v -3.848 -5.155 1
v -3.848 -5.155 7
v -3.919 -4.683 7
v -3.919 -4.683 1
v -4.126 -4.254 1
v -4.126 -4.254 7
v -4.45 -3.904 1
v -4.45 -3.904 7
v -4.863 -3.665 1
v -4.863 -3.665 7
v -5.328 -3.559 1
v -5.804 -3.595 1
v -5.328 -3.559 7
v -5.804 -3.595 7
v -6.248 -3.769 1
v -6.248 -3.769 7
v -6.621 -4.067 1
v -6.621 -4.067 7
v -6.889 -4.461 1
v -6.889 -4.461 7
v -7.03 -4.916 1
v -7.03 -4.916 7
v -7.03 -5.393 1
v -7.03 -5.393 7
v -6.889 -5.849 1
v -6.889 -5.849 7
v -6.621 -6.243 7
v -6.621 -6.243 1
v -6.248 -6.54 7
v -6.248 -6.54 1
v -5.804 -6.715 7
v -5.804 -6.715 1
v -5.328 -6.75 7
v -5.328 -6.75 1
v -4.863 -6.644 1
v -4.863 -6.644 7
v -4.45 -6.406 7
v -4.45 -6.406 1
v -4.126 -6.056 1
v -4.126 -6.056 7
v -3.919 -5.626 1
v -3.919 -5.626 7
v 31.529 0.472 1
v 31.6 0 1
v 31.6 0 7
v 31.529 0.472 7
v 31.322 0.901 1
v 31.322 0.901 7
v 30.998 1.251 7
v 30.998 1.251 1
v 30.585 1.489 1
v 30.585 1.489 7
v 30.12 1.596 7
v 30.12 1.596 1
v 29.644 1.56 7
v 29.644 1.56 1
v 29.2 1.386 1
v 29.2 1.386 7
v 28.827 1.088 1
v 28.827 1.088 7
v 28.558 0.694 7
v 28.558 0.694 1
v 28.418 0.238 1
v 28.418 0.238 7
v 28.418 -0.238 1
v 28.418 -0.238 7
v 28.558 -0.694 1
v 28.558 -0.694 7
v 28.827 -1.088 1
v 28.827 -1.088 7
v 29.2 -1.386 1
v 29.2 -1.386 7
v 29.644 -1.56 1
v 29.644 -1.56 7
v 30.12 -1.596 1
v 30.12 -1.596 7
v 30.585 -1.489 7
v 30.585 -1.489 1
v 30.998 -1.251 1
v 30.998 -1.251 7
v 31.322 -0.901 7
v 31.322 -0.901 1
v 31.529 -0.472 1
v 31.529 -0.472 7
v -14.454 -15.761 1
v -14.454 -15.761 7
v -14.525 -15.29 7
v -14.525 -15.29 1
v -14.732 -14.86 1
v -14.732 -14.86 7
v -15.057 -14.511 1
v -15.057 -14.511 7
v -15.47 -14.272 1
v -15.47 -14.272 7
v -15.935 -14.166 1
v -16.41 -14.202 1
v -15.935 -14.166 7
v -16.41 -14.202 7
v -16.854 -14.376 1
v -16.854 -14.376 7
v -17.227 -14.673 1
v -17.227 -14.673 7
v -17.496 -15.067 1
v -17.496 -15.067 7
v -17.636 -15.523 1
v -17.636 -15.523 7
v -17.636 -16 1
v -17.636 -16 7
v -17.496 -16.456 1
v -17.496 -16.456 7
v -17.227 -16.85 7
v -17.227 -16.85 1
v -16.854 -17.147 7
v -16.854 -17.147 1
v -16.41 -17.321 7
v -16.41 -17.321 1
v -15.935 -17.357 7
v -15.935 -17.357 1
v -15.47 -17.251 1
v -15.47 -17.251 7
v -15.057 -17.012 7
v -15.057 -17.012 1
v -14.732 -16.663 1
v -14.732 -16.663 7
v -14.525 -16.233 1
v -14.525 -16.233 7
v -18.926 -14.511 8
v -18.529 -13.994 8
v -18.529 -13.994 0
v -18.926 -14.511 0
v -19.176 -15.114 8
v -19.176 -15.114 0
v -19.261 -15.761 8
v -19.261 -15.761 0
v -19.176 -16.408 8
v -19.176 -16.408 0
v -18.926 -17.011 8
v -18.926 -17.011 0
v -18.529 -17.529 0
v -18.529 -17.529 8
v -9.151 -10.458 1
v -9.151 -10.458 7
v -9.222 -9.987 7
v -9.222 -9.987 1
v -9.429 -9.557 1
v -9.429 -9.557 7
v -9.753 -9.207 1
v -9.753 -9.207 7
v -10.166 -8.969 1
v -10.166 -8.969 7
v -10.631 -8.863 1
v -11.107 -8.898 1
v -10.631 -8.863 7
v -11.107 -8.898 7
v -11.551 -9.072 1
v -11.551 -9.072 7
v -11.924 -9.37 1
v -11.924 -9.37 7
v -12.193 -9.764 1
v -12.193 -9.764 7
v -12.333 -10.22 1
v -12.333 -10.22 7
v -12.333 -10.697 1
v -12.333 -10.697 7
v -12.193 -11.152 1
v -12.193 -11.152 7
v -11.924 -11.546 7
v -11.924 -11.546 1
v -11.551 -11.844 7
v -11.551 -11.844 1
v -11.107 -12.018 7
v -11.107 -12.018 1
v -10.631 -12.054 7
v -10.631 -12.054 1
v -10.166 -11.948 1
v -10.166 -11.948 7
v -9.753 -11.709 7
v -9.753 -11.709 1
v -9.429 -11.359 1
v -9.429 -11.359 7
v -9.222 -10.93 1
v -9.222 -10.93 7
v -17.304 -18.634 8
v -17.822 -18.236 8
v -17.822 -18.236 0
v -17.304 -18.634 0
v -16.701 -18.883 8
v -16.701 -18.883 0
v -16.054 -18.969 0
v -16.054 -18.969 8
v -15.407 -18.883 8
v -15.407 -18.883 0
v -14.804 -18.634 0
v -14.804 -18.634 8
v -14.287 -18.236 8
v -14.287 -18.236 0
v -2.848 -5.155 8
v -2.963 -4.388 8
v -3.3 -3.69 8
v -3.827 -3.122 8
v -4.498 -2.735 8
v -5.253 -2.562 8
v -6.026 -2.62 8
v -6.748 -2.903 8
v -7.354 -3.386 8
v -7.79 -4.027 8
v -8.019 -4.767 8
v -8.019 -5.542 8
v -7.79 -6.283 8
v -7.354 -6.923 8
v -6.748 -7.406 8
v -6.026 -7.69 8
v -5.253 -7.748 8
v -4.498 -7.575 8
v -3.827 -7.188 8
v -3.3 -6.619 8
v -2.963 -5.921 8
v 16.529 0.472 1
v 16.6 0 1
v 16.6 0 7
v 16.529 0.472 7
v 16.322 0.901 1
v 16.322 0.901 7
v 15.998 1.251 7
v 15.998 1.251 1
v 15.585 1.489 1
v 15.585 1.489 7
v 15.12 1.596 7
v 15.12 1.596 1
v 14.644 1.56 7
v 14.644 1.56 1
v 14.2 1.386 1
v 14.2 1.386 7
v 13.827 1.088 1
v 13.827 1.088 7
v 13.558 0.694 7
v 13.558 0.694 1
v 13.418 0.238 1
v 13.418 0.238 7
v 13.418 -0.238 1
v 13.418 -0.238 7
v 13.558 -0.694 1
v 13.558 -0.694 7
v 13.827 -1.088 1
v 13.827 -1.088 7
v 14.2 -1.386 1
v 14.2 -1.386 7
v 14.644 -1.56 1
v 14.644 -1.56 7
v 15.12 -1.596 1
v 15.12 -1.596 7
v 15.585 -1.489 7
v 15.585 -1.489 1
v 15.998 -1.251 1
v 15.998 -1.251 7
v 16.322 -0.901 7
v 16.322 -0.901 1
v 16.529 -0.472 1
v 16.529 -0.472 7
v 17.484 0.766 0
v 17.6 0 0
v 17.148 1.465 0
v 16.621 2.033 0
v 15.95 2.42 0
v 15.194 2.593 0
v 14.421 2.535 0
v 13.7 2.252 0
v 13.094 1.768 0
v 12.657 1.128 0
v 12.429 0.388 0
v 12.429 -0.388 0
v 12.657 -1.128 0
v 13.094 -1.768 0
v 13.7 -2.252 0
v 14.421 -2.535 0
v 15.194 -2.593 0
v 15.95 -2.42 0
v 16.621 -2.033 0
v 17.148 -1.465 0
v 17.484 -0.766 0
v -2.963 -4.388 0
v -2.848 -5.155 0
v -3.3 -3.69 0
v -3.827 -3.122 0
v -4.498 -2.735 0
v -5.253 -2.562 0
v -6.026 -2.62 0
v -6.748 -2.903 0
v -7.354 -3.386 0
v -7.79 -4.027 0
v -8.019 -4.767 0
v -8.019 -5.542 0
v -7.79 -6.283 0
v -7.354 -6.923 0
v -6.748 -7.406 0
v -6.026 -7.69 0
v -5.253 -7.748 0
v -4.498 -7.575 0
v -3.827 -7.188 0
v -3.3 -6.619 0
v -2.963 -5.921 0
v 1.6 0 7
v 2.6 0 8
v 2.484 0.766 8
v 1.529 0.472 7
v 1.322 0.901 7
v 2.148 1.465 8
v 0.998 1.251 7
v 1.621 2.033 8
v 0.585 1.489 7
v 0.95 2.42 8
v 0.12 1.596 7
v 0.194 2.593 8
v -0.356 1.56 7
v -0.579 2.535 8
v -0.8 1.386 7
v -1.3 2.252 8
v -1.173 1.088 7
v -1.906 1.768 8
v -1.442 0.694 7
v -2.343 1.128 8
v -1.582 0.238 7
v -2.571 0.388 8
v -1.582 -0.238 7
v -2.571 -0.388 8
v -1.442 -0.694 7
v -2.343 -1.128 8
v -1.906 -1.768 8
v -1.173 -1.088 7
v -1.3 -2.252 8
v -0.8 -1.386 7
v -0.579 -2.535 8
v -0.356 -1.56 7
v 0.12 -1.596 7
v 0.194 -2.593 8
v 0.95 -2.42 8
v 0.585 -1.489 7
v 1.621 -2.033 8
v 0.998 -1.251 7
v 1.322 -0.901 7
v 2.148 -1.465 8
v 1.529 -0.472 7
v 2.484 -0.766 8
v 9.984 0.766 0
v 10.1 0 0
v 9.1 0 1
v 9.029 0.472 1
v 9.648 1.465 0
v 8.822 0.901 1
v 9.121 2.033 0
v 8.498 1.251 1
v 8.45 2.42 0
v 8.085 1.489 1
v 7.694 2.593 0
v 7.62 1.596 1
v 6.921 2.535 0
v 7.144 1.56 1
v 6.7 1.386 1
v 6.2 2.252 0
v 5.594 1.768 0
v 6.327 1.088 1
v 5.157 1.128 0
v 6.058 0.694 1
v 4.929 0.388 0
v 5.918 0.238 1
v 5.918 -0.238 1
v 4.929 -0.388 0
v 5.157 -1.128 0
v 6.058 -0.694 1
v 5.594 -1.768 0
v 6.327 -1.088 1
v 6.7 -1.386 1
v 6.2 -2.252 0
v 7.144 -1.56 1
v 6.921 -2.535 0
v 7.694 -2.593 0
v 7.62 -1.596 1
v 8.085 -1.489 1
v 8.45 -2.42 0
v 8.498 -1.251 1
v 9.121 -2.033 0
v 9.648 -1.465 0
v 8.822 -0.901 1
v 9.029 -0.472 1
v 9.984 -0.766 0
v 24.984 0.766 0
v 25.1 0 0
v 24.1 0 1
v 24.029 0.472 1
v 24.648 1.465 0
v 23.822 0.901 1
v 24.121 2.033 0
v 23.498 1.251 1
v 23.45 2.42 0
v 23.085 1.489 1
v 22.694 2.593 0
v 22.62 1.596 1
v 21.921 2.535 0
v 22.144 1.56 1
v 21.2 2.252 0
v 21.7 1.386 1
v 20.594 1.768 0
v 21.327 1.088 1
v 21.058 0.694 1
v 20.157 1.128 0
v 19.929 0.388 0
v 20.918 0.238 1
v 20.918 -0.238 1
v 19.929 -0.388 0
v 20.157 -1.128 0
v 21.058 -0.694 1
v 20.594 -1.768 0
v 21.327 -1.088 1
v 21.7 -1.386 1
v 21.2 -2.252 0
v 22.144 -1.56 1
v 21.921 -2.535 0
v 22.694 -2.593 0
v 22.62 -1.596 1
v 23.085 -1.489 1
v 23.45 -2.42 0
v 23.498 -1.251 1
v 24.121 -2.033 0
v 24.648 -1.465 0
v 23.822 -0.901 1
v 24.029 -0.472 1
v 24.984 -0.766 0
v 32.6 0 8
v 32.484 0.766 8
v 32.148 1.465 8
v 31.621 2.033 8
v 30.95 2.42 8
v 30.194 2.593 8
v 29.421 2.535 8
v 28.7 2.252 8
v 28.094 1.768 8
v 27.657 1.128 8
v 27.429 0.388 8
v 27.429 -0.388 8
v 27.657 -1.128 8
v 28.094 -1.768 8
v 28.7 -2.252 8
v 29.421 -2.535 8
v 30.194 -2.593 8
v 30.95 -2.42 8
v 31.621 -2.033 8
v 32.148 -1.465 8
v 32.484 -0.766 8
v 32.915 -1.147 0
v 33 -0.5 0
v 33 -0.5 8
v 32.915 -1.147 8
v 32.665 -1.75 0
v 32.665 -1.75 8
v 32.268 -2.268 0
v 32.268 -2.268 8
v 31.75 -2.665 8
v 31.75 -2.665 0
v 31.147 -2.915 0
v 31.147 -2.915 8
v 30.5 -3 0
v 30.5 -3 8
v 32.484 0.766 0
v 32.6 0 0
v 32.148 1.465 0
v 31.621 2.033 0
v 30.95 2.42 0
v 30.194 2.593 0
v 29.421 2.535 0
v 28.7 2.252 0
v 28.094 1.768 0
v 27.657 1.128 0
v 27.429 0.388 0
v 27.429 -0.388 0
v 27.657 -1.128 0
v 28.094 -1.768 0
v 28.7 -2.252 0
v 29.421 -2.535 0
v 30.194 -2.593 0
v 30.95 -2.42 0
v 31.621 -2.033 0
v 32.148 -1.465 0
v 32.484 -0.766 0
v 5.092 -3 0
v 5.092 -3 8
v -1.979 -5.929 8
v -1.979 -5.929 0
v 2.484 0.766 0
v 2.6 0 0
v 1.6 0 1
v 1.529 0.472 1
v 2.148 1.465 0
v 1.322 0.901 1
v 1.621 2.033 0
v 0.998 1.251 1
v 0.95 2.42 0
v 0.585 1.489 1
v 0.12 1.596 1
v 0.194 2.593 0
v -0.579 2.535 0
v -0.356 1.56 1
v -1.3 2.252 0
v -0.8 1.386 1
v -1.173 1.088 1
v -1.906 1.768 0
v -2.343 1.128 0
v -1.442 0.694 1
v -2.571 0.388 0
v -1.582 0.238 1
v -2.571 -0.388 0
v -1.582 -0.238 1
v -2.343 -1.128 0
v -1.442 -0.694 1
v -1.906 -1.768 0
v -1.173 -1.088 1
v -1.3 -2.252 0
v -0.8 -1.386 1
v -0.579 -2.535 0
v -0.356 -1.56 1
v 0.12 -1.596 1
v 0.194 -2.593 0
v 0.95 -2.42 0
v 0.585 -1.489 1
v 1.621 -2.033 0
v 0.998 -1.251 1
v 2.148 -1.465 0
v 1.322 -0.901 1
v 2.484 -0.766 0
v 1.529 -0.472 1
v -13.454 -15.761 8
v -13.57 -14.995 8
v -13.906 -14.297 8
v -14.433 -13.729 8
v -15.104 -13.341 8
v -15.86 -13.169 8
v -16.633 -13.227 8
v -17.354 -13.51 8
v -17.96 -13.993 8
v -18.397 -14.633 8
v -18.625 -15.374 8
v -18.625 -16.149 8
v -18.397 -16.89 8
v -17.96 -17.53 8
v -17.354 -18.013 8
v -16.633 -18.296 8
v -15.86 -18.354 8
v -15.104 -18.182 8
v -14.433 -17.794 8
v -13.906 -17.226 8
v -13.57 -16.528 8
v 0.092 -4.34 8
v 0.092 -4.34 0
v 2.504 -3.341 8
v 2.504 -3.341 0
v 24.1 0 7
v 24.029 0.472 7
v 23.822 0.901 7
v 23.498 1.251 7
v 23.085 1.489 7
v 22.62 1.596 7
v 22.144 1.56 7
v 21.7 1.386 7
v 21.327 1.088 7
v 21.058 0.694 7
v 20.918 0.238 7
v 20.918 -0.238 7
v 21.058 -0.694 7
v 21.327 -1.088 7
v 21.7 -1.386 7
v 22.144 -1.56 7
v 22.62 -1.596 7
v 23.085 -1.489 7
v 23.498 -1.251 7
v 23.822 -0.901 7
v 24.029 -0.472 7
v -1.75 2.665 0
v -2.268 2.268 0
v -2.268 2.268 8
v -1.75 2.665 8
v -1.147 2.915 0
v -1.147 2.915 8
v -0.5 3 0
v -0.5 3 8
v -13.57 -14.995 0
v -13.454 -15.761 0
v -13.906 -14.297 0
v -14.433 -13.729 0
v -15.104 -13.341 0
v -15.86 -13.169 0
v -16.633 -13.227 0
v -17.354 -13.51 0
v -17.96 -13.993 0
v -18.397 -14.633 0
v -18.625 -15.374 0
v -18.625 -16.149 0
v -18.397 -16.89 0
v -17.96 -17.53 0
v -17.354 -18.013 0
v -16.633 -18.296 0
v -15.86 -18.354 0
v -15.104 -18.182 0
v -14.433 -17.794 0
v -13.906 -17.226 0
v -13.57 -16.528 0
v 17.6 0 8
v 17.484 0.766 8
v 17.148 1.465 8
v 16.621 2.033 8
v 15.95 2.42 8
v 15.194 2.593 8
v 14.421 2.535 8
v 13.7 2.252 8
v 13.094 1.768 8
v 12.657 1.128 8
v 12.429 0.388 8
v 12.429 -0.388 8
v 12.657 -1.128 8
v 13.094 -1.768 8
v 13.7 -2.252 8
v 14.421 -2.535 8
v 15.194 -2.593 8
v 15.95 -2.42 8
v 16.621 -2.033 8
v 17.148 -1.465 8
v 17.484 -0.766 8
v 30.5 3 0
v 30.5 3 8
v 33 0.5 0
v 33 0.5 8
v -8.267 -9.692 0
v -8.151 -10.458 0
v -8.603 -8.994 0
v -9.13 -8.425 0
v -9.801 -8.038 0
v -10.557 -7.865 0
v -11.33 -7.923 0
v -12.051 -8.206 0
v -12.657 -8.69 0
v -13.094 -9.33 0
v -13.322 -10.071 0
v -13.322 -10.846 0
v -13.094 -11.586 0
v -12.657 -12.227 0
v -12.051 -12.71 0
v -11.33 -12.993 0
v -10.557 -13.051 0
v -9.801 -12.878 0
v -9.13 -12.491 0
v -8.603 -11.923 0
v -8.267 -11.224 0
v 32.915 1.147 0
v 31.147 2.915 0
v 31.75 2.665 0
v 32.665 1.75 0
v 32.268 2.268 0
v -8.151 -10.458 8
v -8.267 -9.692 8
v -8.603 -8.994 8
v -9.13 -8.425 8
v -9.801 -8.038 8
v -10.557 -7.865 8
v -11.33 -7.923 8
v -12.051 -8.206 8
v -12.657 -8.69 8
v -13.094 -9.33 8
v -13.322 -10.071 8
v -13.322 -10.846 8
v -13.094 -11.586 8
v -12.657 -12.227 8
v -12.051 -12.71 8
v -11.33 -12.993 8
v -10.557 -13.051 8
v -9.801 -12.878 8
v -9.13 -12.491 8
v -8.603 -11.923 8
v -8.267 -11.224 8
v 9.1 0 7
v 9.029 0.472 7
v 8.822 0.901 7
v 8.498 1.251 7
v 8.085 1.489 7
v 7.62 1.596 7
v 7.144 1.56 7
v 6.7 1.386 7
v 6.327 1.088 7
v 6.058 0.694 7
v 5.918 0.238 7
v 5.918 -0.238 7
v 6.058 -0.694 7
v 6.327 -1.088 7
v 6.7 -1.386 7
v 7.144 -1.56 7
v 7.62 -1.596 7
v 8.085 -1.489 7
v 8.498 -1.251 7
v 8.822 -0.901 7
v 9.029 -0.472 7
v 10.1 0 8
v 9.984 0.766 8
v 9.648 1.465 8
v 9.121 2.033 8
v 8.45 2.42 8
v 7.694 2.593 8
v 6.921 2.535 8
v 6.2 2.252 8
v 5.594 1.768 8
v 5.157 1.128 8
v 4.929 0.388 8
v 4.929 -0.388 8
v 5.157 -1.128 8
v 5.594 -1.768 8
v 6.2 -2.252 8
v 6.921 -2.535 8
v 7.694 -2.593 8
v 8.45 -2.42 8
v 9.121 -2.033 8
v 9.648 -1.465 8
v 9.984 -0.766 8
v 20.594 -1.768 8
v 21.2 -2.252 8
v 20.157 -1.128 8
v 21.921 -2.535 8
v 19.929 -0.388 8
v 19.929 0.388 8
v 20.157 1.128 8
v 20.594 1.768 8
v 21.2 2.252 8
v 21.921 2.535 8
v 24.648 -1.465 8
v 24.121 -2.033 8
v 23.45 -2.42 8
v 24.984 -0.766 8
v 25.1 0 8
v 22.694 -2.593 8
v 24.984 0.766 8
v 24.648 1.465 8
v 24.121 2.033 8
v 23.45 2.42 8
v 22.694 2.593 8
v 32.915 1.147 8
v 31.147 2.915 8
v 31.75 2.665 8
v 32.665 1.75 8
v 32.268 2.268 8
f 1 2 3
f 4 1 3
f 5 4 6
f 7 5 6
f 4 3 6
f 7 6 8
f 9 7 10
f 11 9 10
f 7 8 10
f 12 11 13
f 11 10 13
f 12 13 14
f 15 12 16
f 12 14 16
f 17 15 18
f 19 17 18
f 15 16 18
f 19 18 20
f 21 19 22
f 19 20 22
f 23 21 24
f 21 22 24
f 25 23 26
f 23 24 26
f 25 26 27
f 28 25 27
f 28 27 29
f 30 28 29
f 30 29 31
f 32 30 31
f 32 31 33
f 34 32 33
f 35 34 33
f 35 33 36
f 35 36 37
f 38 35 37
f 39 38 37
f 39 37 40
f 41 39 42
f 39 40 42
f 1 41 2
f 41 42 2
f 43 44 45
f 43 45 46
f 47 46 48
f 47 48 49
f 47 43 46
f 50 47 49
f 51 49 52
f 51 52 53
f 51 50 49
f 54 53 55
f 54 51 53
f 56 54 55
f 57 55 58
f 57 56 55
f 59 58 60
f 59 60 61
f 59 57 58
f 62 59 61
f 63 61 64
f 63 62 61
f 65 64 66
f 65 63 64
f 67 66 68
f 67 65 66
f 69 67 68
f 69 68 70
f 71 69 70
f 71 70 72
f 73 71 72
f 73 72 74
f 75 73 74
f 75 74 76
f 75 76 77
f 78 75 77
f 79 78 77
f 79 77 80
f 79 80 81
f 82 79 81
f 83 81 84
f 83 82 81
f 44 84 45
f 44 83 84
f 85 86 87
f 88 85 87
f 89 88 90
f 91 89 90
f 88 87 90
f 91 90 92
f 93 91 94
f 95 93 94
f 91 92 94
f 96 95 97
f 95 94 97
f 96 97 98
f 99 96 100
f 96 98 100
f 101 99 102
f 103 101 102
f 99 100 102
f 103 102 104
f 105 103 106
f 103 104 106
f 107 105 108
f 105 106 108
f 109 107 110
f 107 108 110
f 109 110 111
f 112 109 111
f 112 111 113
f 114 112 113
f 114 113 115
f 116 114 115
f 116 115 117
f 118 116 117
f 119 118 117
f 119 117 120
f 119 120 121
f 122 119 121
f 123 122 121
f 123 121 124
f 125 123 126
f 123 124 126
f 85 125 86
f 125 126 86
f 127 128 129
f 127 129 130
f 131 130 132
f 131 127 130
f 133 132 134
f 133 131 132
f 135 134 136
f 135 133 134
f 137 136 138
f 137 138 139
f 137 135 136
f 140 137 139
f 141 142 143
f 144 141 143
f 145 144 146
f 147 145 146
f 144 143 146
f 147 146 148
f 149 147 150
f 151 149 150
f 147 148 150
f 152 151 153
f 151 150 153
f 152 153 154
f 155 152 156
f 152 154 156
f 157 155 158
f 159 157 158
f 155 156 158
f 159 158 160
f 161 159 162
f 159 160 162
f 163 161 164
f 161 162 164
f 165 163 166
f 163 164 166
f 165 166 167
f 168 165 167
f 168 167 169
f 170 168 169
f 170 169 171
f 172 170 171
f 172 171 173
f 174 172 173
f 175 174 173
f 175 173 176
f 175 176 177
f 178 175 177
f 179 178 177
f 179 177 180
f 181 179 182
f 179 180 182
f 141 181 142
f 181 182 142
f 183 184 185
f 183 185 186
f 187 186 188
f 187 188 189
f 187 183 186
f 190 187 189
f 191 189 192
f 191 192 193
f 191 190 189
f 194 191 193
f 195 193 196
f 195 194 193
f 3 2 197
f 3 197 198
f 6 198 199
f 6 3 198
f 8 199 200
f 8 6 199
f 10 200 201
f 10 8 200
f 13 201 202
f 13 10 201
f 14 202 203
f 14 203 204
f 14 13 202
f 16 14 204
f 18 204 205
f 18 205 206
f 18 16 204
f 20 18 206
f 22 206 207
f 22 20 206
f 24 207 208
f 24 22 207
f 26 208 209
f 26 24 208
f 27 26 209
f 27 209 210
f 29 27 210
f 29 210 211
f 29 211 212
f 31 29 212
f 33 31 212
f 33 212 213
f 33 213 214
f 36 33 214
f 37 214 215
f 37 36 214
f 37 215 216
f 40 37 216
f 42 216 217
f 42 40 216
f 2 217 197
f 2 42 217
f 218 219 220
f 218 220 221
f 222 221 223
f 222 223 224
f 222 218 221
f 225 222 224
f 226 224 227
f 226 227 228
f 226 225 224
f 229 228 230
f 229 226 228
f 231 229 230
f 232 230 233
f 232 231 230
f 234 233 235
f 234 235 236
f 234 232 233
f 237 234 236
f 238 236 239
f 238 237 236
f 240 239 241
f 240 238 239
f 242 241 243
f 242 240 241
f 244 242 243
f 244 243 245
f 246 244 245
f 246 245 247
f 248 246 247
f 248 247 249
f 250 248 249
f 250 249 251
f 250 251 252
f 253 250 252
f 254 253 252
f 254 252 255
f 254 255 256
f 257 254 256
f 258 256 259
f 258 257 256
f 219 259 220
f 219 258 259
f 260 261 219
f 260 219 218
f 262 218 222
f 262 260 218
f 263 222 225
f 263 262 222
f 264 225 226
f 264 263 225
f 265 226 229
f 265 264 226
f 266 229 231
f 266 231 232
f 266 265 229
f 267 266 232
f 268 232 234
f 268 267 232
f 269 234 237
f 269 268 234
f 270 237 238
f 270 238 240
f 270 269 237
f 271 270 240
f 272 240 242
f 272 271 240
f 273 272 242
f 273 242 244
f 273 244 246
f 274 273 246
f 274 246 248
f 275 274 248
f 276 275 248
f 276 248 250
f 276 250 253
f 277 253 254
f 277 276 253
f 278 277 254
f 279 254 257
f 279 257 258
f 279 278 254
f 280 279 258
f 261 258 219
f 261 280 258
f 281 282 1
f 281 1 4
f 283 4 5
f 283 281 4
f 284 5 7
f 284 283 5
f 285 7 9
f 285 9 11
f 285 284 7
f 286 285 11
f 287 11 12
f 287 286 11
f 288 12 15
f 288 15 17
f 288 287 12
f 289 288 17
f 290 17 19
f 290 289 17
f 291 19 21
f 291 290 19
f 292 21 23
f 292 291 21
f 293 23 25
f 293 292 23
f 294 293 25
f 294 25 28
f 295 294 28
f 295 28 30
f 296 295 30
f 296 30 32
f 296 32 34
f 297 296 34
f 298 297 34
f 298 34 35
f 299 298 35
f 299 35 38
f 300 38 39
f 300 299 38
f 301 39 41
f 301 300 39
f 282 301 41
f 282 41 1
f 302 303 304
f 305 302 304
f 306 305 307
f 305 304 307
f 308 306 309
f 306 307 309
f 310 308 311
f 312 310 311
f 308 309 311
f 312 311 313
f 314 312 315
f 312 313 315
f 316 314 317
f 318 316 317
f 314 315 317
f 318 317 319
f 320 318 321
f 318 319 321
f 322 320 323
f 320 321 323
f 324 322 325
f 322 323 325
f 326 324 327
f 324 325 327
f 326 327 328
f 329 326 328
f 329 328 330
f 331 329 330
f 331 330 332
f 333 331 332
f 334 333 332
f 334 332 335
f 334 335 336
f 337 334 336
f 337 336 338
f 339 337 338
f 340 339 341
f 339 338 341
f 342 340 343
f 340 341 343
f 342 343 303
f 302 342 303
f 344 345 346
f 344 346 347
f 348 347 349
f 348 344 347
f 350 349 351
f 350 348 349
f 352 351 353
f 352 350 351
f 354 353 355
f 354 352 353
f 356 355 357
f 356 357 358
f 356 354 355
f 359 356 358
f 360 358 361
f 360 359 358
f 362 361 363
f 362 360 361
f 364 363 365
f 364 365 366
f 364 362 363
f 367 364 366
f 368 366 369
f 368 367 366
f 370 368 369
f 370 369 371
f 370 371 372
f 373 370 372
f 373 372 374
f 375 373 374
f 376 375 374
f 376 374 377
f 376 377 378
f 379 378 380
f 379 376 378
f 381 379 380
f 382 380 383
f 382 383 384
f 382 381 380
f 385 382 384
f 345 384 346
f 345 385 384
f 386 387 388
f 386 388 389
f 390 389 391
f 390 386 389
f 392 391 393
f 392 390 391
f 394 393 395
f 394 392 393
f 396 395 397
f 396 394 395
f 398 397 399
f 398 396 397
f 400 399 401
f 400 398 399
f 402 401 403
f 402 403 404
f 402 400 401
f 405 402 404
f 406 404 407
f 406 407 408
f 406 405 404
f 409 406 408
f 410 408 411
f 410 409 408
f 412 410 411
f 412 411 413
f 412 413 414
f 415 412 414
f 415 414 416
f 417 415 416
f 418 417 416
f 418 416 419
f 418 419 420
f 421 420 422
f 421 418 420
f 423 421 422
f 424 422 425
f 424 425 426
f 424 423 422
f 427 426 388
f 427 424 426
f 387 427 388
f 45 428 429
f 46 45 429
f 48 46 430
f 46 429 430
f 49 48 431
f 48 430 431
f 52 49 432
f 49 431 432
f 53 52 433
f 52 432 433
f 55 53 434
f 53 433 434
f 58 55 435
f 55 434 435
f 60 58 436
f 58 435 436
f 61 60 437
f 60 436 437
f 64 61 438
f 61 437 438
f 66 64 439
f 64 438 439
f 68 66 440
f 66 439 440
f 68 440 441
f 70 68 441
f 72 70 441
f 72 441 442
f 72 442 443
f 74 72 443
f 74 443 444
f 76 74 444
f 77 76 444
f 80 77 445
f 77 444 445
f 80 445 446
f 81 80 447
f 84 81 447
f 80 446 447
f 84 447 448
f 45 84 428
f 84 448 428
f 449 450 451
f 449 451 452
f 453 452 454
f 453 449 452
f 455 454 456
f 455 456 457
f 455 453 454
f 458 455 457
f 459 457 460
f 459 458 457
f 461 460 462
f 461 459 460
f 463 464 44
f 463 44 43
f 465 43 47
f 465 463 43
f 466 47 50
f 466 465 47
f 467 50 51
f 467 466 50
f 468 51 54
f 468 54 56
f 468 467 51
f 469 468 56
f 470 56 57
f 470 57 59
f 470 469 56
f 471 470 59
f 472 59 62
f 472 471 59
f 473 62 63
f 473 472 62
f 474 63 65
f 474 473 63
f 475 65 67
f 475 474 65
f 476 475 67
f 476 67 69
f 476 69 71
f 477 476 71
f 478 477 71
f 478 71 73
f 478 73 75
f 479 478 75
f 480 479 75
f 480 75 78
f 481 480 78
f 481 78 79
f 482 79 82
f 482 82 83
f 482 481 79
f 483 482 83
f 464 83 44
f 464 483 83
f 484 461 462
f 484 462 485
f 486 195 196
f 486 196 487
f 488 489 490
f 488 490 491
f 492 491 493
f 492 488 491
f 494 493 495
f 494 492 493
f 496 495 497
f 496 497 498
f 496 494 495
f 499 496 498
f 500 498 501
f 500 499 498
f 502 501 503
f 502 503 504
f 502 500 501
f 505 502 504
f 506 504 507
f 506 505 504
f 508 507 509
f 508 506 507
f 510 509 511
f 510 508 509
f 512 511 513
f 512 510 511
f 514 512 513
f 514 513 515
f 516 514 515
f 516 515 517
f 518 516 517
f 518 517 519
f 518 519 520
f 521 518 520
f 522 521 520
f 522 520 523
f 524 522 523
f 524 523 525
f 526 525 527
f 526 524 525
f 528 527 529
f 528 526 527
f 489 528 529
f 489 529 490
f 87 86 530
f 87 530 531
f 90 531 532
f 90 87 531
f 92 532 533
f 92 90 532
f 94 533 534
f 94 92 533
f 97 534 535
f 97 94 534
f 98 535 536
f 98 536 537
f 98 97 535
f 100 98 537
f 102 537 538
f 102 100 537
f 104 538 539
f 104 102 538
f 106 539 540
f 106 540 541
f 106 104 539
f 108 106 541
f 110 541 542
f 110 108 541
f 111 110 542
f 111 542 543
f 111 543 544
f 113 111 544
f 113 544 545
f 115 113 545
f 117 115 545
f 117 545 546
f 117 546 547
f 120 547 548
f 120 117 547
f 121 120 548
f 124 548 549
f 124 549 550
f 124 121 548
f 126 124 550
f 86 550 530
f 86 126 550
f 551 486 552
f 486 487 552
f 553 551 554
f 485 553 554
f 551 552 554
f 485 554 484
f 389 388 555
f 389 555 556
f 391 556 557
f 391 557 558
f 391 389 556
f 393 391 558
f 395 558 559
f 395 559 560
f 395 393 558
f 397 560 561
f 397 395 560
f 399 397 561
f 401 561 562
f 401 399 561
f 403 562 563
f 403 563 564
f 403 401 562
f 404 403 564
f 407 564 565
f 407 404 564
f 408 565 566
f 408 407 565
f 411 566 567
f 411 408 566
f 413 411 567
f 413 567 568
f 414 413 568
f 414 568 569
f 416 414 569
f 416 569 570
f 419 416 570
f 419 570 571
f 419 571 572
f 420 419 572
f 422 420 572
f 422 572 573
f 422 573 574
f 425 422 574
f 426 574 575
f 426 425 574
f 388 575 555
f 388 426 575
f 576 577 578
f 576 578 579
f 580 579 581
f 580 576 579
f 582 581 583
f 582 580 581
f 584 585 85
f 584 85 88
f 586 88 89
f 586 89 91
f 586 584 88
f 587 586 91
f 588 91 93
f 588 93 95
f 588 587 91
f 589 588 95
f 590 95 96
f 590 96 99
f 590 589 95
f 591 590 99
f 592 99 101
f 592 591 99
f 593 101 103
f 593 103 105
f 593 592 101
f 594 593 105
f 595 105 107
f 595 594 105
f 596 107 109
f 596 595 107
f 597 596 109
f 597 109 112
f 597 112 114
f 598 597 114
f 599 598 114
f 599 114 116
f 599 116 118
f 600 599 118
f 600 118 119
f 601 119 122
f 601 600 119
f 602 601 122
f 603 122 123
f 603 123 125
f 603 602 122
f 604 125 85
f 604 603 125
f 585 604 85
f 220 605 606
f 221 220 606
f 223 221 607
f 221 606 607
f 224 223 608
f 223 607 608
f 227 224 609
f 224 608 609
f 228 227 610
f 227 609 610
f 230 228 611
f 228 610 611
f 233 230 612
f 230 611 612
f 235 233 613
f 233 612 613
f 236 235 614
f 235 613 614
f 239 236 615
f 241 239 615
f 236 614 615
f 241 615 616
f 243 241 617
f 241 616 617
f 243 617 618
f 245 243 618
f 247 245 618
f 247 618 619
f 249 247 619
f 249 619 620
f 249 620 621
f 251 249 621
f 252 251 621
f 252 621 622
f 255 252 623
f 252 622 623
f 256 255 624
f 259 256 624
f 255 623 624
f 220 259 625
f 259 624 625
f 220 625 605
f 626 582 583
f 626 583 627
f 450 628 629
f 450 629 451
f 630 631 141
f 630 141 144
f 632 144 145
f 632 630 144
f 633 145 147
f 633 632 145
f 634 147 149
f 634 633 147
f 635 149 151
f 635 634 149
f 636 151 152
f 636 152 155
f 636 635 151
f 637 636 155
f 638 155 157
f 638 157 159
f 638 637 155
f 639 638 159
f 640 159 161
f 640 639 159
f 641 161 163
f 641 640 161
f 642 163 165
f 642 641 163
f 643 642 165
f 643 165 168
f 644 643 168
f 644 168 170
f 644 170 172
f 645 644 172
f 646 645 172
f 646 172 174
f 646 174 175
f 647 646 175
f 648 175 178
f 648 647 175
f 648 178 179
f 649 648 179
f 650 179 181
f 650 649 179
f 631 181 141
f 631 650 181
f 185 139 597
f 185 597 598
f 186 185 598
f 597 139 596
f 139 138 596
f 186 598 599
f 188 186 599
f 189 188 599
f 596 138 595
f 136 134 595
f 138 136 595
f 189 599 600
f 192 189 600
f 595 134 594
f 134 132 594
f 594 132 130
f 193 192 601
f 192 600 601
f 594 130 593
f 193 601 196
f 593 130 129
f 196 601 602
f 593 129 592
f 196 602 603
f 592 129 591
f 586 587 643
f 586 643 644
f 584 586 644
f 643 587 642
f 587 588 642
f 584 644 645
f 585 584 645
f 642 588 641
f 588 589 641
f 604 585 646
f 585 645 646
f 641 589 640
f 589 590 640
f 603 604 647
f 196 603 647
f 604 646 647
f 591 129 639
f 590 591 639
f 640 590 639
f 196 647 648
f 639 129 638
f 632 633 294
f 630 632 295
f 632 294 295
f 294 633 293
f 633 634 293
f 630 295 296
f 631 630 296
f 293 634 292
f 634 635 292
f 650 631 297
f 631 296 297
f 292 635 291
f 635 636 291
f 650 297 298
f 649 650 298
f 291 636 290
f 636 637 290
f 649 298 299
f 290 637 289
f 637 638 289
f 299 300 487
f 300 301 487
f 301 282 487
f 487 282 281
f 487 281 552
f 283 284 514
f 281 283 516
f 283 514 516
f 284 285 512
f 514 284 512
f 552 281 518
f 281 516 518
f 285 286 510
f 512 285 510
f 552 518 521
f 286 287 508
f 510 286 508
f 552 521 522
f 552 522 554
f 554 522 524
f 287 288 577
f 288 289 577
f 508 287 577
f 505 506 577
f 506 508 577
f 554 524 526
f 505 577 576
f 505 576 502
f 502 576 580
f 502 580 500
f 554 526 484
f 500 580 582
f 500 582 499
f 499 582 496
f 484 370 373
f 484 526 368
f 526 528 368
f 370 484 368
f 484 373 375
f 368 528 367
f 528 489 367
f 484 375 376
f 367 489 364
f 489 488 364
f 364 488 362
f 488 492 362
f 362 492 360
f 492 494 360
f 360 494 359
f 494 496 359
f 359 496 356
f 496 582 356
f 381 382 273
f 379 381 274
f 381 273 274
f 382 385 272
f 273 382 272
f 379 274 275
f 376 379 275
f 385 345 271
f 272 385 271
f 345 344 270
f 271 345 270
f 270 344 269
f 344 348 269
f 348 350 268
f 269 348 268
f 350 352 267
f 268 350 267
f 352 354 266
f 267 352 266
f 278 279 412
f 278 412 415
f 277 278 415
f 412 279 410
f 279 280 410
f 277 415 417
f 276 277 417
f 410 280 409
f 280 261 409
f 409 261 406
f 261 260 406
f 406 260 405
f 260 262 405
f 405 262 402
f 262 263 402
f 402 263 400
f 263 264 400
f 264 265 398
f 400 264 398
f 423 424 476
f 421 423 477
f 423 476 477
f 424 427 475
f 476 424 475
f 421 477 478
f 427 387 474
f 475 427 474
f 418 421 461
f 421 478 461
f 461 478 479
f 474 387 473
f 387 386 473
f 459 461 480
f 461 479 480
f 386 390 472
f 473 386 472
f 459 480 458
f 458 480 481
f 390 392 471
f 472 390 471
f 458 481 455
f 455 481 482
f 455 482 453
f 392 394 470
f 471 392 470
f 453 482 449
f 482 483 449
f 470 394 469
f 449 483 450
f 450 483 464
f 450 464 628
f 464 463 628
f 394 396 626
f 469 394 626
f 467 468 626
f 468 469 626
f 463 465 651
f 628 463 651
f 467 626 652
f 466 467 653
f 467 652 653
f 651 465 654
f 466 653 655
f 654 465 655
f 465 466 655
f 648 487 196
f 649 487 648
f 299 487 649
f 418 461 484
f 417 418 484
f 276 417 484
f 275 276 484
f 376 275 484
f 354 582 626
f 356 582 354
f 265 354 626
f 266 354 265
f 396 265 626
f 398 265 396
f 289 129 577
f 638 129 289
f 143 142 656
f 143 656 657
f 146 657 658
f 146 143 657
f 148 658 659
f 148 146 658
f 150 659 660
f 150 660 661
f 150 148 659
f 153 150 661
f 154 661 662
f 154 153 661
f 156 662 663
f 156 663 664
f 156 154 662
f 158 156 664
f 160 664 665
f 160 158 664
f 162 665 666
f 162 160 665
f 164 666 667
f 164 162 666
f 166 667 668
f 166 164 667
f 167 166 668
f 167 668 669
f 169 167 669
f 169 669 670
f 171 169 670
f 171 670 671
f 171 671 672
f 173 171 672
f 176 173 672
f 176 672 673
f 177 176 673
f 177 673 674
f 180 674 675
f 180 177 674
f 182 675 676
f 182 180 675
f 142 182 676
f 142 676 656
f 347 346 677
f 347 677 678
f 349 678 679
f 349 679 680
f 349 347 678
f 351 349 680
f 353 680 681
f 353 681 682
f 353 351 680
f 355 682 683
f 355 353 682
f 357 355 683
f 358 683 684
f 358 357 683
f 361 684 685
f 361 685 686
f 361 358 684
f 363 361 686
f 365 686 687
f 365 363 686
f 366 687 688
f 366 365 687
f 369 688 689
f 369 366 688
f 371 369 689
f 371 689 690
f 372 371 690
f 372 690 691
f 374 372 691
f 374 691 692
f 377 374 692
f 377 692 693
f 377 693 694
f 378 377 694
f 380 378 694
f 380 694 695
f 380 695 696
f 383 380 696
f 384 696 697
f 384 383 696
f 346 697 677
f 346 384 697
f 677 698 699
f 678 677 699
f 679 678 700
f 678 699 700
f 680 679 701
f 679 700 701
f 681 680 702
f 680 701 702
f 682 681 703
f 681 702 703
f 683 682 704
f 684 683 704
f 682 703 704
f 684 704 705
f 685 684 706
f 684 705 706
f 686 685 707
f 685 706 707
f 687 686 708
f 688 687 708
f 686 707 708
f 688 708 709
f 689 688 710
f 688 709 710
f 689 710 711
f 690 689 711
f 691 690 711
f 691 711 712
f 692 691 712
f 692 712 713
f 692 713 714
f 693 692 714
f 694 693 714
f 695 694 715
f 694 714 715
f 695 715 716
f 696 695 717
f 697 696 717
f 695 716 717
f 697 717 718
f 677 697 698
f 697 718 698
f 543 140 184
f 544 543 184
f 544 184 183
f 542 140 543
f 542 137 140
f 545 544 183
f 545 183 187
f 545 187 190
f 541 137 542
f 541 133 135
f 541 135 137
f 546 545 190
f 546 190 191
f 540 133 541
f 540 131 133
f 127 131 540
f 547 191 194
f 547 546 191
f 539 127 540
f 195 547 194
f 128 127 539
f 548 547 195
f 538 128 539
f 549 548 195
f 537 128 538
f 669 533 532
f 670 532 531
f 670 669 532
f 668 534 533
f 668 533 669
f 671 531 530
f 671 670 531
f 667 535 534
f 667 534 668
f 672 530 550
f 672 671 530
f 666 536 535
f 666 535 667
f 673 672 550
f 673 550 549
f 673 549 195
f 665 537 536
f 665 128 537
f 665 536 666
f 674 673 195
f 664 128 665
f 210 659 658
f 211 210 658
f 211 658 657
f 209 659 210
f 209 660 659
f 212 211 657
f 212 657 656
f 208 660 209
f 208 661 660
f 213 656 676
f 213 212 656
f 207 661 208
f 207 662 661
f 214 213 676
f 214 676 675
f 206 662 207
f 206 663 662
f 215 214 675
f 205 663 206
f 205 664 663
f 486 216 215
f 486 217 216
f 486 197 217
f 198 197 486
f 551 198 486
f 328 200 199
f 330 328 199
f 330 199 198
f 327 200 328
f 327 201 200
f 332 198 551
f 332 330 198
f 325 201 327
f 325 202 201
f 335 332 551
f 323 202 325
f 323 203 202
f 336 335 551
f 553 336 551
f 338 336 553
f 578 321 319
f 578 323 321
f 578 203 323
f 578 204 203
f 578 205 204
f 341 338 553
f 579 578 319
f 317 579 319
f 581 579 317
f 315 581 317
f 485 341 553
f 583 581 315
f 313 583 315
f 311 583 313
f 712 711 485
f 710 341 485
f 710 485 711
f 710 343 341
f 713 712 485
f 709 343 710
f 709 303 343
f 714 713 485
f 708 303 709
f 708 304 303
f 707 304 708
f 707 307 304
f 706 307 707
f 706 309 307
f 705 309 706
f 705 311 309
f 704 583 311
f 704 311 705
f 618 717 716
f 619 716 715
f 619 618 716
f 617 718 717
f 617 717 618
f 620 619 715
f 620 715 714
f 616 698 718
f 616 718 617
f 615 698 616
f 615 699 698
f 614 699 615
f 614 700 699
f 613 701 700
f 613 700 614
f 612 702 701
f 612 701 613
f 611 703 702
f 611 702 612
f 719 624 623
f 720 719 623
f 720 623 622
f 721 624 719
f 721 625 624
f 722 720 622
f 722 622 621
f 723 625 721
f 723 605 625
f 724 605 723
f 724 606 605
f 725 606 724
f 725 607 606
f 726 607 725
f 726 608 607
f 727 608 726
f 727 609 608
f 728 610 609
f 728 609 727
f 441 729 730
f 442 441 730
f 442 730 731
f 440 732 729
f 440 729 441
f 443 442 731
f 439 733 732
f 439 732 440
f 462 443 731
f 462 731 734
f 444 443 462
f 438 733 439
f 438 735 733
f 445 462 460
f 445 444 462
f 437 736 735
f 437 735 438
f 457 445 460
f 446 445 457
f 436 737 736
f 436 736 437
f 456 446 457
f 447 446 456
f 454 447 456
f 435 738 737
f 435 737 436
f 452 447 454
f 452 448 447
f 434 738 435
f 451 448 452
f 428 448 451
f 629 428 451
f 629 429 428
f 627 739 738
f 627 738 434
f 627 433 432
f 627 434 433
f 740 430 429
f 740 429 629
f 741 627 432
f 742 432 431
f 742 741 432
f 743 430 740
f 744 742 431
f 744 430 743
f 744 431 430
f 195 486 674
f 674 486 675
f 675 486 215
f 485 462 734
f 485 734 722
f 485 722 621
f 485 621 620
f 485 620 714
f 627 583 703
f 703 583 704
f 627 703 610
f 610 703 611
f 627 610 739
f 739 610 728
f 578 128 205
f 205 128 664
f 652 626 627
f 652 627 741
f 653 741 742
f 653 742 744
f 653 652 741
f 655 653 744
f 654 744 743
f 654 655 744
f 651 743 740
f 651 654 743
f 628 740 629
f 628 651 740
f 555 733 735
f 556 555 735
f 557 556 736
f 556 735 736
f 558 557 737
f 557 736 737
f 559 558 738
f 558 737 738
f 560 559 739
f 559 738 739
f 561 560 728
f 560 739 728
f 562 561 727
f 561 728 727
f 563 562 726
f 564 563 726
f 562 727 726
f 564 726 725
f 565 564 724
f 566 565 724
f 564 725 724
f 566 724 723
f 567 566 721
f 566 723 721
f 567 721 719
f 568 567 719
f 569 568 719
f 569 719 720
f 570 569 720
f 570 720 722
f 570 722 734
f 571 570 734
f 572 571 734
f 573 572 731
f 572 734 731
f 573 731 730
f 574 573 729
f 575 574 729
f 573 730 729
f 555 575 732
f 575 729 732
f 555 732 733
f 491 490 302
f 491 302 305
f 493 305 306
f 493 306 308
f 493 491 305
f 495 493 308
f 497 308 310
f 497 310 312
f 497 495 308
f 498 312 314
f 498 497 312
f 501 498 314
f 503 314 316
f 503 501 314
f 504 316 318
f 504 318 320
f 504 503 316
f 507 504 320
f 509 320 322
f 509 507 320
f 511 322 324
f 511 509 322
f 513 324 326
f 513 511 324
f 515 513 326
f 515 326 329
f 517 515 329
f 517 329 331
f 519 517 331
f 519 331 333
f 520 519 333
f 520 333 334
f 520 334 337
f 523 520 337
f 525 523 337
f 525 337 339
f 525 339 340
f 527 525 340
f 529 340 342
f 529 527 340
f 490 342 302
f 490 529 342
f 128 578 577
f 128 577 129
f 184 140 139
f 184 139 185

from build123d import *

# Parameters (mm, degrees)
SKETCH1_R           = 1.6
BOSS_EXTRUDE1_DEPTH = 8
CHAMFER1_SIZE       = 1
SKETCH2_R           = 1.6
BOSS_EXTRUDE3_DEPTH = 8
FILLET1_R           = 10
CHAMFER2_SIZE       = 1


with BuildPart() as part:
    # Sketch1 → Boss-Extrude1 (new body)
    with BuildSketch(Plane.XY):
        with BuildLine():
            Line((-0.5, 3), (30.5, 3))
            ThreePointArc((30.5, 3), (32.267766953, 2.267766953), (33, 0.5))
            Line((33, 0.5), (33, -0.5))
            ThreePointArc((33, -0.5), (32.267766953, -2.267766953), (30.5, -3))
            Line((30.5, -3), (-0.5, -3))
            ThreePointArc((-0.5, -3), (-2.267766953, -2.267766953), (-3, -0.5))
            Line((-3, -0.5), (-3, 0.5))
            ThreePointArc((-3, 0.5), (-2.267766953, 2.267766953), (-0.5, 3))
        make_face()
        Circle(SKETCH1_R, mode=Mode.SUBTRACT)
        with Locations((7.5, 0)):
            Circle(SKETCH1_R, mode=Mode.SUBTRACT)
        with Locations((15, 0)):
            Circle(SKETCH1_R, mode=Mode.SUBTRACT)
        with Locations((22.5, 0)):
            Circle(SKETCH1_R, mode=Mode.SUBTRACT)
        with Locations((30, 0)):
            Circle(SKETCH1_R, mode=Mode.SUBTRACT)
    extrude(amount=BOSS_EXTRUDE1_DEPTH)

    # Chamfer1
    chamfer1_edges = [part.edges().sort_by_distance(p)[0] for p in [
        (-1.6, 0, 0),
        (-1.6, 0, 8),
        (5.9, 0, 0),
        (5.9, 0, 8),
        (13.4, 0, 0),
        (13.4, 0, 8),
        (20.9, 0, 0),
        (20.9, 0, 8),
        (28.4, 0, 0),
        (28.4, 0, 8),
    ]]
    chamfer(chamfer1_edges, length=CHAMFER1_SIZE)

    # Sketch2 → Boss-Extrude3 (add)
    with BuildSketch(Plane.XY.offset(8)):
        with BuildLine():
            ThreePointArc((-3, 0.5), (-2.809698831, 1.456708581), (-2.267766953, 2.267766953))
            Line((-2.267766953, 2.267766953), (-18.529200529, -13.993666623))
            ThreePointArc((-18.529200529, -13.993666623), (-19.261433576, -15.761433576), (-18.529200529, -17.529200529))
            Line((-18.529200529, -17.529200529), (-17.822093748, -18.23630731))
            ThreePointArc((-17.822093748, -18.23630731), (-16.054326795, -18.968540357), (-14.286559842, -18.23630731))
            Line((-14.286559842, -18.23630731), (0.949747468, -3))
            Line((0.949747468, -3), (-0.5, -3))
            ThreePointArc((-0.5, -3), (-2.267766953, -2.267766953), (-3, -0.5))
            Line((-3, -0.5), (-3, 0.5))
        make_face()
        with Locations((-16.054326795, -15.761433576)):
            Circle(SKETCH2_R, mode=Mode.SUBTRACT)
        with Locations((-10.751025936, -10.458132717)):
            Circle(SKETCH2_R, mode=Mode.SUBTRACT)
        with Locations((-5.447725077, -5.154831858)):
            Circle(SKETCH2_R, mode=Mode.SUBTRACT)
    extrude(amount=-BOSS_EXTRUDE3_DEPTH)

    # Fillet1
    fillet1_edges = [part.edges().sort_by_distance(p)[0] for p in [
        (0.949747468, -3, 4),
    ]]
    fillet(fillet1_edges, radius=FILLET1_R)

    # Chamfer2
    chamfer2_edges = [part.edges().sort_by_distance(p)[0] for p in [
        (-17.654326795, -15.761433576, 8),
        (-12.351025936, -10.458132717, 8),
        (-7.047725077, -5.154831858, 8),
        (-7.047725077, -5.154831858, 0),
        (-12.351025936, -10.458132717, 0),
        (-17.654326795, -15.761433576, 0),
    ]]
    chamfer(chamfer2_edges, length=CHAMFER2_SIZE)


solid = part.part
